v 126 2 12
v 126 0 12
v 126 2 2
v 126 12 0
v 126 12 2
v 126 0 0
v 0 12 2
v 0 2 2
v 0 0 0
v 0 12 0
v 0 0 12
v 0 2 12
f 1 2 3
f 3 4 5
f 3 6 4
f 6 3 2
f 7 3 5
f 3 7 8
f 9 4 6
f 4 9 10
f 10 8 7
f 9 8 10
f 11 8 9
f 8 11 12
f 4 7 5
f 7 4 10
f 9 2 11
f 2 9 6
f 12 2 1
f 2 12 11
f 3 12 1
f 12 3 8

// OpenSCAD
long = 126;

height = 2;

width = 12;

union() {
    cube([long, width, height]);

    cube([long, height, width]);
}
